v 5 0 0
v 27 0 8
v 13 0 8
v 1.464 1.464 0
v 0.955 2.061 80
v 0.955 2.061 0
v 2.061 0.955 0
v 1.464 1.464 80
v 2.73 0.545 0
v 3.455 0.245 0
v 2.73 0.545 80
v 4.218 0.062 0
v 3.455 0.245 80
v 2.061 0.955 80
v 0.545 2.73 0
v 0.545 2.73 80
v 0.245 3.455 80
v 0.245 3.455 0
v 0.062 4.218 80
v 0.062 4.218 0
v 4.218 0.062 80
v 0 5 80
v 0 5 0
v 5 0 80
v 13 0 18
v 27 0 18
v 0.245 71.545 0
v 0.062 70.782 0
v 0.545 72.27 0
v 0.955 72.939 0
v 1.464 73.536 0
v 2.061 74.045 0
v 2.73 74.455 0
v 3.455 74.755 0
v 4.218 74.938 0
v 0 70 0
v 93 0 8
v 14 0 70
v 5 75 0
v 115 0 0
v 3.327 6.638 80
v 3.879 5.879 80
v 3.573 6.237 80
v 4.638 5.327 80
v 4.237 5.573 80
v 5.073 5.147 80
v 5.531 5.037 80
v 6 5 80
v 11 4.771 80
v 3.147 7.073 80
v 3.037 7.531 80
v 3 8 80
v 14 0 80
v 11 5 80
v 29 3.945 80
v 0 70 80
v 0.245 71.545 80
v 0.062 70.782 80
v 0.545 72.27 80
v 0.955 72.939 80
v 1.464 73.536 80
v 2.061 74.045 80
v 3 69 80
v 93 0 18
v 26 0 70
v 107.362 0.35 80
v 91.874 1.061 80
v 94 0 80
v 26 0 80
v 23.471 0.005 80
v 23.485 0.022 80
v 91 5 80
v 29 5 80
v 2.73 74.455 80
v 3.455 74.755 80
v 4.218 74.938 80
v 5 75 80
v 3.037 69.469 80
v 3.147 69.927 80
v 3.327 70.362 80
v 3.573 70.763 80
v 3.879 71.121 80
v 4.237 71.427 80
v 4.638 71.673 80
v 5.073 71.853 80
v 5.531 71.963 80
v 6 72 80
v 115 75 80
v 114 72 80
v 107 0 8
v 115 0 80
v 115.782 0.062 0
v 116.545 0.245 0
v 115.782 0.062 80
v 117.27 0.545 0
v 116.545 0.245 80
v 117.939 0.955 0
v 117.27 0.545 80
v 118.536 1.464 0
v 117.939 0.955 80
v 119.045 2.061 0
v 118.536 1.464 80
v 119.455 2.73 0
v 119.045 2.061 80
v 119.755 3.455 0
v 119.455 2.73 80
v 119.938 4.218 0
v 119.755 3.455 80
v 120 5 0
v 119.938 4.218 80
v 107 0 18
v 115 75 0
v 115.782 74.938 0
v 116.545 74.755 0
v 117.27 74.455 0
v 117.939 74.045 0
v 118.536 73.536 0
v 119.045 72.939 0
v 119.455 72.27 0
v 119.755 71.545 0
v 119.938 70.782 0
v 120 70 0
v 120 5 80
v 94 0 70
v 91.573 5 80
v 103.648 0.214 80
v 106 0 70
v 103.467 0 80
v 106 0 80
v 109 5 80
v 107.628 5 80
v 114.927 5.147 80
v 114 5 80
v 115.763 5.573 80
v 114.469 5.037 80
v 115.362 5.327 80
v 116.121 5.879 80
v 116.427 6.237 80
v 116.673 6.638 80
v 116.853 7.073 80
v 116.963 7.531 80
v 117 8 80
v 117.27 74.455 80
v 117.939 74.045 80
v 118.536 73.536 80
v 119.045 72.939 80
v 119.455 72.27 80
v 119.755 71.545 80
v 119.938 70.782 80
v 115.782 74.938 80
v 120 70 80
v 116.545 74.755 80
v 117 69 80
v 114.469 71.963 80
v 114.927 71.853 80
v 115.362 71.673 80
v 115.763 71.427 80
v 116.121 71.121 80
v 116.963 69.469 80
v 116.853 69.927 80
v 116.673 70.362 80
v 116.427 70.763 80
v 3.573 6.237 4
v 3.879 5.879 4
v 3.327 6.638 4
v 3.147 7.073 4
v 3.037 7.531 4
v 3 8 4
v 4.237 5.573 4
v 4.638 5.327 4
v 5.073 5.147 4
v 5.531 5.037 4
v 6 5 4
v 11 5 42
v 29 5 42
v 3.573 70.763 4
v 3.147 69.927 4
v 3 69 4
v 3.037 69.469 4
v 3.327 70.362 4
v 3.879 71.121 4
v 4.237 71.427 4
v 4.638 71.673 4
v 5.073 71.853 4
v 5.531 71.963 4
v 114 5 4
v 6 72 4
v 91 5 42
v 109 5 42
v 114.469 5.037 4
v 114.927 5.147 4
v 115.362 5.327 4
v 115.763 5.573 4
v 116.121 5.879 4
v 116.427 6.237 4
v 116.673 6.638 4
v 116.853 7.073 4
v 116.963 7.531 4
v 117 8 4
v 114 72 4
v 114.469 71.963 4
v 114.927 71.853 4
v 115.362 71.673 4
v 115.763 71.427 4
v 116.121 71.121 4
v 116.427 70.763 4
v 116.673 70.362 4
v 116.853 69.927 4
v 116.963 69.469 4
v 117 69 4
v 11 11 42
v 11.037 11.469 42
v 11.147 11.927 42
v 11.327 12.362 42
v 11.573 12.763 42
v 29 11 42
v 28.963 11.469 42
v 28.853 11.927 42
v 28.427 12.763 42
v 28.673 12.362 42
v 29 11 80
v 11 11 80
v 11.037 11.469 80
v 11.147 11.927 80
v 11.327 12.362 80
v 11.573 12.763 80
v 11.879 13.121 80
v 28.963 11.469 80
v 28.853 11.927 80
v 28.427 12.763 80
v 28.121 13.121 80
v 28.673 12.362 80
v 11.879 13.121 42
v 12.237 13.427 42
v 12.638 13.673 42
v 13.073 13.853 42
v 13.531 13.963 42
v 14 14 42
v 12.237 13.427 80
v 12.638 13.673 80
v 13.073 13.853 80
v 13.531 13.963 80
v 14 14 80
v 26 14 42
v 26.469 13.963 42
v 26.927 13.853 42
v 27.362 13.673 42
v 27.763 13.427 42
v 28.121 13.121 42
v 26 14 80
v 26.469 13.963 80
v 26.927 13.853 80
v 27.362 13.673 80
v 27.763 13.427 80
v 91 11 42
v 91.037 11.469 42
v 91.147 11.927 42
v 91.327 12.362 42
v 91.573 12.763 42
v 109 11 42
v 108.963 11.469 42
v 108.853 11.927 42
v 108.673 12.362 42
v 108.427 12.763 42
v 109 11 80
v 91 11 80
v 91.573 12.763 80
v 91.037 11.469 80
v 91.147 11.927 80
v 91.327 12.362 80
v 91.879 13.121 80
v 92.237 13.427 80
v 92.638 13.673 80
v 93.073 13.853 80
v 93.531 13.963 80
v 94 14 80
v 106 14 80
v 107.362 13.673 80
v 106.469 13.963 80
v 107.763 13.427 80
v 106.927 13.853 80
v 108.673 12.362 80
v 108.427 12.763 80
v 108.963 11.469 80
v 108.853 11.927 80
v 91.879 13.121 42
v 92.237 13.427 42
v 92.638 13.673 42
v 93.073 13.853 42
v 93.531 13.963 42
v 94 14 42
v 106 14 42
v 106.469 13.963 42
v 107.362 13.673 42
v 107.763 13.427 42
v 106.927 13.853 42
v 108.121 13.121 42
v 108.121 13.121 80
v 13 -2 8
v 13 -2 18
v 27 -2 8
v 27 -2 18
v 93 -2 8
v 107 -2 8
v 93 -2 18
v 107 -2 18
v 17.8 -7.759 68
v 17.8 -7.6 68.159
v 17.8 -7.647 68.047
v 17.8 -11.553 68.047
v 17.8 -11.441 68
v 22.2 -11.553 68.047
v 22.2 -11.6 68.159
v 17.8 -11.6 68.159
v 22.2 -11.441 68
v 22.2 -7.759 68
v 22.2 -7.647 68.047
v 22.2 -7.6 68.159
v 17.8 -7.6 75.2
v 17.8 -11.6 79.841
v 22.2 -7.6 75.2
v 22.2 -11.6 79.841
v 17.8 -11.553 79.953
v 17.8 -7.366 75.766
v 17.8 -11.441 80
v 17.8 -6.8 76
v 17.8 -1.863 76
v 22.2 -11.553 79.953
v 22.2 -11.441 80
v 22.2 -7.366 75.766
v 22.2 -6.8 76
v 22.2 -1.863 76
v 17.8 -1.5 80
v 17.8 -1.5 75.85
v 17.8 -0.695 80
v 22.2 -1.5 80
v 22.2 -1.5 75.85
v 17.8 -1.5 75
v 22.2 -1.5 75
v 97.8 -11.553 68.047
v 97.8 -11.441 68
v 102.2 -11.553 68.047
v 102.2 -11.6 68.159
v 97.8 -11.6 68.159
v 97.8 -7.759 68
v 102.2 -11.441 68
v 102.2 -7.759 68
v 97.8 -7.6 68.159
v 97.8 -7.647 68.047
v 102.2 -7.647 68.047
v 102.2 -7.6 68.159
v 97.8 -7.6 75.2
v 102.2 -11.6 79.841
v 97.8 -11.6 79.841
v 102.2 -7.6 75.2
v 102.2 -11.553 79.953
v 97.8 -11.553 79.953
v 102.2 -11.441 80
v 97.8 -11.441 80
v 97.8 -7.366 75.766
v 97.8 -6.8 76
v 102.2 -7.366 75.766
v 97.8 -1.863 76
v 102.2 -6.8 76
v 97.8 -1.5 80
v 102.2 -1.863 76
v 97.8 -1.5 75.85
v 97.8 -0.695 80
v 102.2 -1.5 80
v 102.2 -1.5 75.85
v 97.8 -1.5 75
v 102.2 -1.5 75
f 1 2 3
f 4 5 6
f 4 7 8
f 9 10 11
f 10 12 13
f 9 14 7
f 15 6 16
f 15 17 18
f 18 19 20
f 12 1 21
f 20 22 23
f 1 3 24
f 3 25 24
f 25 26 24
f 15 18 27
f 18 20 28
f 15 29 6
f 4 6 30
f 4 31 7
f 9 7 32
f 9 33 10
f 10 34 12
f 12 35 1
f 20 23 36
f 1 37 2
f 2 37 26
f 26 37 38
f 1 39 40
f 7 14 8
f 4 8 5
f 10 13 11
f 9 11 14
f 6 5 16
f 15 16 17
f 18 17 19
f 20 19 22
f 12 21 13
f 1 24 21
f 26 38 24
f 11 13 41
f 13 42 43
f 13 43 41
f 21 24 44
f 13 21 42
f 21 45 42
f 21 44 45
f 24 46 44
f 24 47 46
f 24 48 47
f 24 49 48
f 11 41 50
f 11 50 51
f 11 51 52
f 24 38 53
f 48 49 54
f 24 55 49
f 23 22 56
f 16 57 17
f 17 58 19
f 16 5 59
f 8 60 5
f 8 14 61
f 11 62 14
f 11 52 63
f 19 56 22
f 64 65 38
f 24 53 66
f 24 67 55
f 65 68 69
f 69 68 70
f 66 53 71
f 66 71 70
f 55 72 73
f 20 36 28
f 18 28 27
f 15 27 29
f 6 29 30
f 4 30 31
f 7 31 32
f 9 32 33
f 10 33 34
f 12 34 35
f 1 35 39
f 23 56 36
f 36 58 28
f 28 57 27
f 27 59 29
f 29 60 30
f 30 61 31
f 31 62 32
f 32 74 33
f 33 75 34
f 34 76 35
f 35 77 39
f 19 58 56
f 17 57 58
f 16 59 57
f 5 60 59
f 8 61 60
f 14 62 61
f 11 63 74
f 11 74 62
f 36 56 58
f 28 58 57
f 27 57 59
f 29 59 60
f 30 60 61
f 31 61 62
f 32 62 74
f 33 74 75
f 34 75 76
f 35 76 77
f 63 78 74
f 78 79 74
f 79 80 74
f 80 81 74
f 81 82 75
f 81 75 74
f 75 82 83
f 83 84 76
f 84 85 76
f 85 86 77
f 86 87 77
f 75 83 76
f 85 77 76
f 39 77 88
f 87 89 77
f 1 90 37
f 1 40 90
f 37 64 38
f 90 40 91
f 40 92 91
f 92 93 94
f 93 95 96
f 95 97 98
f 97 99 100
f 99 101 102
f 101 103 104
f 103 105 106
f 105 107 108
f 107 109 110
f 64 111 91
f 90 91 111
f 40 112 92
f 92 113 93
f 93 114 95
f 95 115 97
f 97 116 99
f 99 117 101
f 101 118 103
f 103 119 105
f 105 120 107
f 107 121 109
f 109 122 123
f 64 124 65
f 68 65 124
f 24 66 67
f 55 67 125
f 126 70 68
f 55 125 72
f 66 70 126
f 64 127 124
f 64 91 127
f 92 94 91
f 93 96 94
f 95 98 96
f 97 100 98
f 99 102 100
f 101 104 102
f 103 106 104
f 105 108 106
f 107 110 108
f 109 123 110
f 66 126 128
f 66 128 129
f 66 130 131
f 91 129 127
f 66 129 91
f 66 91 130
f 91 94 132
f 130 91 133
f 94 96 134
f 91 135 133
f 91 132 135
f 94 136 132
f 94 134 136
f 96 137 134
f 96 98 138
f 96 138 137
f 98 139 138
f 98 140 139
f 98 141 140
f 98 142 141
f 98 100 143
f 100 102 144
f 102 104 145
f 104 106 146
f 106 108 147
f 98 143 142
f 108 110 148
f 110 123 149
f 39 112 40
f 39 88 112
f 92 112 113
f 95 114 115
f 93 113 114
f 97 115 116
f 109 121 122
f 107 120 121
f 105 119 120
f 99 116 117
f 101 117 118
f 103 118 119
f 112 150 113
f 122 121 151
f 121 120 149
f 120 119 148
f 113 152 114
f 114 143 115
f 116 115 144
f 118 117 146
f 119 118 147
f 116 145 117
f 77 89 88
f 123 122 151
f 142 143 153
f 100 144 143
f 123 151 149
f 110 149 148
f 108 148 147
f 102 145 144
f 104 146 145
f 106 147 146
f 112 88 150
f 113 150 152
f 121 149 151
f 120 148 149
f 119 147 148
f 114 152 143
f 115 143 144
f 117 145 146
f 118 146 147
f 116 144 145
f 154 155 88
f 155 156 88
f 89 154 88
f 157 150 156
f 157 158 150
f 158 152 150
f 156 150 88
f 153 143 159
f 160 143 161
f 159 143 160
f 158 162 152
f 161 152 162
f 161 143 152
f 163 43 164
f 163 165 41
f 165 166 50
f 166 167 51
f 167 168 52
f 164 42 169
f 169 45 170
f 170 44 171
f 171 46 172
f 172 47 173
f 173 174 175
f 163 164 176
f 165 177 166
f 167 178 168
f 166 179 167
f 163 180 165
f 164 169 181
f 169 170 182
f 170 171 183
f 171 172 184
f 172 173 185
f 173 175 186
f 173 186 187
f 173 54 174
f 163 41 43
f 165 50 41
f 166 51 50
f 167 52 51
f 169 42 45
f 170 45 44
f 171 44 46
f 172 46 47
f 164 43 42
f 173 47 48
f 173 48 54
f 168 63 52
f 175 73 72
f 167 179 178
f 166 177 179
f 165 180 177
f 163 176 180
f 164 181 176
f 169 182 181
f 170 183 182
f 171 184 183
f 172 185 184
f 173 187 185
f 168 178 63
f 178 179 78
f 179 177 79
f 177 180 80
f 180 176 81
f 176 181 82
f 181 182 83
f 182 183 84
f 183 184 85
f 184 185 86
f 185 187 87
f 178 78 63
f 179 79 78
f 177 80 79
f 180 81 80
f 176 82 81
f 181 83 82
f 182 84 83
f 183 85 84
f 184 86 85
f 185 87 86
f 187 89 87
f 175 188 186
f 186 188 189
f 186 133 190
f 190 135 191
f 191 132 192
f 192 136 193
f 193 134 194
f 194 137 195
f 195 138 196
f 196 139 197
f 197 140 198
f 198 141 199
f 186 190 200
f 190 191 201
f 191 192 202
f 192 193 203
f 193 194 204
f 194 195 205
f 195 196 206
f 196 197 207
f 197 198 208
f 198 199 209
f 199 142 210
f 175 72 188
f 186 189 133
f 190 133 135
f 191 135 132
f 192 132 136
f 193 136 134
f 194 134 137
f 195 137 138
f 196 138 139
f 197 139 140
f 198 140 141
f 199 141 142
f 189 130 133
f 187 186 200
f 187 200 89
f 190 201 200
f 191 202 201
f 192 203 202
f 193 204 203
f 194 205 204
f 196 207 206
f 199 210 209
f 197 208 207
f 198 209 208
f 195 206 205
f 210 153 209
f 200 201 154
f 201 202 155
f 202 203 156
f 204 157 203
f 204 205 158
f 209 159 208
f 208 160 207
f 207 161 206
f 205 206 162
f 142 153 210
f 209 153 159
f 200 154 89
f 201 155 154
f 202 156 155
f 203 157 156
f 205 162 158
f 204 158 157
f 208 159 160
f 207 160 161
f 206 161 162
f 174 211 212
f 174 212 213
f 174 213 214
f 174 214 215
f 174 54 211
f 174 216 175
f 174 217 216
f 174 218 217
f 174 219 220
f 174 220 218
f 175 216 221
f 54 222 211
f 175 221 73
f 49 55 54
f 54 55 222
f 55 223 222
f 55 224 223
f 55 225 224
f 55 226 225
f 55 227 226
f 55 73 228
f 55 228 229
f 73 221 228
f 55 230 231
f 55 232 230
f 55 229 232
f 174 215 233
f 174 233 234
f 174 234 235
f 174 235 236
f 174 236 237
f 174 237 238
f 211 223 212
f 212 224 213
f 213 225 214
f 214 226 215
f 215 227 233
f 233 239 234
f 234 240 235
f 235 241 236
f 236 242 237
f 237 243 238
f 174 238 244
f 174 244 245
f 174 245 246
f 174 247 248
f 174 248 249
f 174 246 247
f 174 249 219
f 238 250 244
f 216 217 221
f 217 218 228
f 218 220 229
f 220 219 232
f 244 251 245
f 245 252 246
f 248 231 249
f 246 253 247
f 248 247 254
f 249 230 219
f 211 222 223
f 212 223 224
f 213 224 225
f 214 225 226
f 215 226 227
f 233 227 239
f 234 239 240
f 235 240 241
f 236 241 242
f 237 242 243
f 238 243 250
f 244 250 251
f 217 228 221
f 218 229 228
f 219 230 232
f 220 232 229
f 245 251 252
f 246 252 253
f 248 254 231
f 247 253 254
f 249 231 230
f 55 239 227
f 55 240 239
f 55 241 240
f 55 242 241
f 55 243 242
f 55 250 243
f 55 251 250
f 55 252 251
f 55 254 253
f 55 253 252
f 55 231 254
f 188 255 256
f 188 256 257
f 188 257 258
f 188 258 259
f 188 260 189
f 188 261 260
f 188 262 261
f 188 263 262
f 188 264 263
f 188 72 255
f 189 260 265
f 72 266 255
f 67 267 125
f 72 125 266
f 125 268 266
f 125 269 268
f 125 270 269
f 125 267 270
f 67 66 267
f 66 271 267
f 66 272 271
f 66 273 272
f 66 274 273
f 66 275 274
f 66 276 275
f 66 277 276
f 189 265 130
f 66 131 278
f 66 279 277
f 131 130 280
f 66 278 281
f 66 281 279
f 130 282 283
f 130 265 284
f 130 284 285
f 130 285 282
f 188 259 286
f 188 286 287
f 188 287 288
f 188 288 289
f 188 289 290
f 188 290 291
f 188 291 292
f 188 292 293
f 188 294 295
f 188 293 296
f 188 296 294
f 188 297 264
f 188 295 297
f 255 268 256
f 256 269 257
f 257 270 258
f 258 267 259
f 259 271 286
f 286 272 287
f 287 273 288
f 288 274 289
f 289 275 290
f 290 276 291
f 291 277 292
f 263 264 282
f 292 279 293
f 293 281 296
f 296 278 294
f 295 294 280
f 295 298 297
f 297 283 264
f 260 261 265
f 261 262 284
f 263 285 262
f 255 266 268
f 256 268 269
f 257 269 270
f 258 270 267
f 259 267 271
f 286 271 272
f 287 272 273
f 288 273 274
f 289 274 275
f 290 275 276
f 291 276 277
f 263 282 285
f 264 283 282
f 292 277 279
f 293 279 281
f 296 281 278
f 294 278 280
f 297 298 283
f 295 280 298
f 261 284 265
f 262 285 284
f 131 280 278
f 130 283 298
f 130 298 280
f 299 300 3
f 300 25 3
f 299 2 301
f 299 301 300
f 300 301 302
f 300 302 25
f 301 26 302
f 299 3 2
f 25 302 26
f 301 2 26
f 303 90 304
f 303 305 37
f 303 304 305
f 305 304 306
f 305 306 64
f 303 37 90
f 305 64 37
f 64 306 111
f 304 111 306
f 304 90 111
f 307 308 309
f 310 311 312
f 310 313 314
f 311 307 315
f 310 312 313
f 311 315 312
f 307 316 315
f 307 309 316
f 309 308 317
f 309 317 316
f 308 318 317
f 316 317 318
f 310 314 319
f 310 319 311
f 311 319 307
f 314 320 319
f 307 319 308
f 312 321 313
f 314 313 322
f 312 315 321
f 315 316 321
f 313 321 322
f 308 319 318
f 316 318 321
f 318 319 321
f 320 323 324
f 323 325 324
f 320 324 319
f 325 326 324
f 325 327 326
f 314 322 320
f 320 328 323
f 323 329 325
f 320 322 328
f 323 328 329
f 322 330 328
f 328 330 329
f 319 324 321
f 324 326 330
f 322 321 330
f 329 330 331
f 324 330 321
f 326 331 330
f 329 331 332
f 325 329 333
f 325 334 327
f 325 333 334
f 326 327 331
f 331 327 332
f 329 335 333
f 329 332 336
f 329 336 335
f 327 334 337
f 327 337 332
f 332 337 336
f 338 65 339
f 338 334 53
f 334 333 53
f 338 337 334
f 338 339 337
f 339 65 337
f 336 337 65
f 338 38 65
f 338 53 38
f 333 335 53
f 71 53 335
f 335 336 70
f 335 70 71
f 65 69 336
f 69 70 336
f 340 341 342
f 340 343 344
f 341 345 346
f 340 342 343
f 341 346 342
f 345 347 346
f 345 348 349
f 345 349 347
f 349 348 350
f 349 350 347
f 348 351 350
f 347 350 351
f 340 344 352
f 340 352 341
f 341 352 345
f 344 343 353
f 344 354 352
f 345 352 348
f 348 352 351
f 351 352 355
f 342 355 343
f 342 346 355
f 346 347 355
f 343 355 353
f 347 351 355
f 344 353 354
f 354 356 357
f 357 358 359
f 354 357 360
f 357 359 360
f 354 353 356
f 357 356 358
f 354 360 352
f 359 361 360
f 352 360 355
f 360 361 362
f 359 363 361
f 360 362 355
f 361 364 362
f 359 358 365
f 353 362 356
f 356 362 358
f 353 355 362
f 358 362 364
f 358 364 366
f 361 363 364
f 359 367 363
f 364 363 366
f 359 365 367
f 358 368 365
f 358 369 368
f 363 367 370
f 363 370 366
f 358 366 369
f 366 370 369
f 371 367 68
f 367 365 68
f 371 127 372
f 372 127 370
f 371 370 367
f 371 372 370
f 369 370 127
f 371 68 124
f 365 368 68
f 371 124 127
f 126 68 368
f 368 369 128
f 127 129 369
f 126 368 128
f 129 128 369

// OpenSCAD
// SKADIS hook assembly preview. Editable: skadis-integral.scad
color([0.18,0.55,0.64]) polyhedron(points=[[5,0,0],[27,0,8],[13,0,8],[1.4644660949707031,1.4644660949707031,0],[0.9549150466918945,2.0610737800598145,80],[0.9549150466918945,2.0610737800598145,0],[2.0610737800598145,0.9549150466918945,0],[1.4644660949707031,1.4644660949707031,80],[2.7300474643707275,0.5449673533439636,0],[3.4549150466918945,0.24471741914749146,0],[2.7300474643707275,0.5449673533439636,80],[4.217827796936035,0.06155829876661301,0],[3.4549150466918945,0.24471741914749146,80],[2.0610737800598145,0.9549150466918945,80],[0.5449673533439636,2.7300474643707275,0],[0.5449673533439636,2.7300474643707275,80],[0.24471741914749146,3.4549150466918945,80],[0.24471741914749146,3.4549150466918945,0],[0.06155829876661301,4.217827796936035,80],[0.06155829876661301,4.217827796936035,0],[4.217827796936035,0.06155829876661301,80],[0,5,80],[0,5,0],[5,0,80],[13,0,18],[27,0,18],[0.24471741914749146,71.54508209228516,0],[0.06155829876661301,70.78217315673828,0],[0.5449673533439636,72.26995086669922,0],[0.9549150466918945,72.93892669677734,0],[1.4644660949707031,73.53553771972656,0],[2.0610737800598145,74.04508209228516,0],[2.7300474643707275,74.45503234863281,0],[3.4549150466918945,74.75527954101562,0],[4.217827796936035,74.93843841552734,0],[0,70,0],[93,0,8],[14,0,70],[5,75,0],[115,0,0],[3.3269803524017334,6.638028621673584,80],[3.8786797523498535,5.8786797523498535,80],[3.572948932647705,6.236644268035889,80],[4.638028621673584,5.3269805908203125,80],[4.236644268035889,5.572948932647705,80],[5.072948932647705,5.1468305587768555,80],[5.530696392059326,5.036934852600098,80],[6,5,80],[11,4.770642280578613,80],[3.1468305587768555,7.072948932647705,80],[3.0369350910186768,7.530696392059326,80],[3,8,80],[14,0,80],[11,5,80],[29,3.9449541568756104,80],[0,70,80],[0.24471741914749146,71.54508209228516,80],[0.06155829876661301,70.78217315673828,80],[0.5449673533439636,72.26995086669922,80],[0.9549150466918945,72.93892669677734,80],[1.4644660949707031,73.53553771972656,80],[2.0610737800598145,74.04508209228516,80],[3,69,80],[93,0,18],[26,0,70],[107.36196899414062,0.35036829113960266,80],[91.87399291992188,1.0608259439468384,80],[94,0,80],[26,0,80],[23.47108268737793,0.0052294121123850346,80],[23.485448837280273,0.022241592407226562,80],[91,5,80],[29,5,80],[2.7300474643707275,74.45503234863281,80],[3.4549150466918945,74.75527954101562,80],[4.217827796936035,74.93843841552734,80],[5,75,80],[3.0369350910186768,69.46930694580078,80],[3.1468305587768555,69.92704772949219,80],[3.3269803524017334,70.36196899414062,80],[3.572948932647705,70.76335906982422,80],[3.8786797523498535,71.12132263183594,80],[4.236644268035889,71.42704772949219,80],[4.638028621673584,71.67301940917969,80],[5.072948932647705,71.8531723022461,80],[5.530696392059326,71.96306610107422,80],[6,72,80],[115,75,80],[114,72,80],[107,0,8],[115,0,80],[115.78217315673828,0.06155829876661301,0],[116.54508209228516,0.24471741914749146,0],[115.78217315673828,0.06155829876661301,80],[117.26995086669922,0.5449673533439636,0],[116.54508209228516,0.24471741914749146,80],[117.93892669677734,0.9549150466918945,0],[117.26995086669922,0.5449673533439636,80],[118.53553771972656,1.4644660949707031,0],[117.93892669677734,0.9549150466918945,80],[119.04508209228516,2.0610737800598145,0],[118.53553771972656,1.4644660949707031,80],[119.45503234863281,2.7300474643707275,0],[119.04508209228516,2.0610737800598145,80],[119.75527954101562,3.4549150466918945,0],[119.45503234863281,2.7300474643707275,80],[119.93843841552734,4.217827796936035,0],[119.75527954101562,3.4549150466918945,80],[120,5,0],[119.93843841552734,4.217827796936035,80],[107,0,18],[115,75,0],[115.78217315673828,74.93843841552734,0],[116.54508209228516,74.75527954101562,0],[117.26995086669922,74.45503234863281,0],[117.93892669677734,74.04508209228516,0],[118.53553771972656,73.53553771972656,0],[119.04508209228516,72.93892669677734,0],[119.45503234863281,72.26995086669922,0],[119.75527954101562,71.54508209228516,0],[119.93843841552734,70.78217315673828,0],[120,70,0],[120,5,80],[94,0,70],[91.57295227050781,5,80],[103.6476058959961,0.21426697075366974,80],[106,0,70],[103.46666717529297,0,80],[106,0,80],[109,5,80],[107.6277084350586,5,80],[114.92704772949219,5.1468305587768555,80],[114,5,80],[115.76335906982422,5.572948932647705,80],[114.46930694580078,5.036934852600098,80],[115.36196899414062,5.3269805908203125,80],[116.12132263183594,5.8786797523498535,80],[116.42704772949219,6.236644268035889,80],[116.67301940917969,6.638028621673584,80],[116.8531723022461,7.072948932647705,80],[116.96306610107422,7.530696392059326,80],[117,8,80],[117.26995086669922,74.45503234863281,80],[117.93892669677734,74.04508209228516,80],[118.53553771972656,73.53553771972656,80],[119.04508209228516,72.93892669677734,80],[119.45503234863281,72.26995086669922,80],[119.75527954101562,71.54508209228516,80],[119.93843841552734,70.78217315673828,80],[115.78217315673828,74.93843841552734,80],[120,70,80],[116.54508209228516,74.75527954101562,80],[117,69,80],[114.46930694580078,71.96306610107422,80],[114.92704772949219,71.8531723022461,80],[115.36196899414062,71.67301940917969,80],[115.76335906982422,71.42704772949219,80],[116.12132263183594,71.12132263183594,80],[116.96306610107422,69.46930694580078,80],[116.8531723022461,69.92704772949219,80],[116.67301940917969,70.36196899414062,80],[116.42704772949219,70.76335906982422,80],[3.572948932647705,6.236644268035889,4],[3.8786797523498535,5.8786797523498535,4],[3.3269803524017334,6.638028621673584,4],[3.1468305587768555,7.072948932647705,4],[3.0369350910186768,7.530696392059326,4],[3,8,4],[4.236644268035889,5.572948932647705,4],[4.638028621673584,5.3269805908203125,4],[5.072948932647705,5.1468305587768555,4],[5.530696392059326,5.036934852600098,4],[6,5,4],[11,5,42],[29,5,42],[3.572948932647705,70.76335906982422,4],[3.1468305587768555,69.92704772949219,4],[3,69,4],[3.0369350910186768,69.46930694580078,4],[3.3269803524017334,70.36196899414062,4],[3.8786797523498535,71.12132263183594,4],[4.236644268035889,71.42704772949219,4],[4.638028621673584,71.67301940917969,4],[5.072948932647705,71.8531723022461,4],[5.530696392059326,71.96306610107422,4],[114,5,4],[6,72,4],[91,5,42],[109,5,42],[114.46930694580078,5.036934852600098,4],[114.92704772949219,5.1468305587768555,4],[115.36196899414062,5.3269805908203125,4],[115.76335906982422,5.572948932647705,4],[116.12132263183594,5.8786797523498535,4],[116.42704772949219,6.236644268035889,4],[116.67301940917969,6.638028621673584,4],[116.8531723022461,7.072948932647705,4],[116.96306610107422,7.530696392059326,4],[117,8,4],[114,72,4],[114.46930694580078,71.96306610107422,4],[114.92704772949219,71.8531723022461,4],[115.36196899414062,71.67301940917969,4],[115.76335906982422,71.42704772949219,4],[116.12132263183594,71.12132263183594,4],[116.42704772949219,70.76335906982422,4],[116.67301940917969,70.36196899414062,4],[116.8531723022461,69.92704772949219,4],[116.96306610107422,69.46930694580078,4],[117,69,4],[11,11,42],[11.036934852600098,11.469303131103516,42],[11.146830558776855,11.927050590515137,42],[11.326980590820312,12.361971855163574,42],[11.572949409484863,12.76335620880127,42],[29,11,42],[28.963064193725586,11.469303131103516,42],[28.85317039489746,11.927050590515137,42],[28.427051544189453,12.76335620880127,42],[28.673019409179688,12.361971855163574,42],[29,11,80],[11,11,80],[11.036934852600098,11.469303131103516,80],[11.146830558776855,11.927050590515137,80],[11.326980590820312,12.361971855163574,80],[11.572949409484863,12.76335620880127,80],[11.878679275512695,13.121320724487305,80],[28.963064193725586,11.469303131103516,80],[28.85317039489746,11.927050590515137,80],[28.427051544189453,12.76335620880127,80],[28.121320724487305,13.121320724487305,80],[28.673019409179688,12.361971855163574,80],[11.878679275512695,13.121320724487305,42],[12.23664379119873,13.427050590515137,42],[12.638028144836426,13.673019409179688,42],[13.072949409484863,13.853169441223145,42],[13.530696868896484,13.963065147399902,42],[14,14,42],[12.23664379119873,13.427050590515137,80],[12.638028144836426,13.673019409179688,80],[13.072949409484863,13.853169441223145,80],[13.530696868896484,13.963065147399902,80],[14,14,80],[26,14,42],[26.469303131103516,13.963065147399902,42],[26.927051544189453,13.853169441223145,42],[27.361970901489258,13.673019409179688,42],[27.763355255126953,13.427050590515137,42],[28.121320724487305,13.121320724487305,42],[26,14,80],[26.469303131103516,13.963065147399902,80],[26.927051544189453,13.853169441223145,80],[27.361970901489258,13.673019409179688,80],[27.763355255126953,13.427050590515137,80],[91,11,42],[91.03693389892578,11.469303131103516,42],[91.1468276977539,11.927050590515137,42],[91.32698059082031,12.361971855163574,42],[91.57295227050781,12.76335620880127,42],[109,11,42],[108.96306610107422,11.469303131103516,42],[108.8531723022461,11.927050590515137,42],[108.67301940917969,12.361971855163574,42],[108.42704772949219,12.76335620880127,42],[109,11,80],[91,11,80],[91.57295227050781,12.76335620880127,80],[91.03693389892578,11.469303131103516,80],[91.1468276977539,11.927050590515137,80],[91.32698059082031,12.361971855163574,80],[91.87867736816406,13.121320724487305,80],[92.23664093017578,13.427050590515137,80],[92.63803100585938,13.673019409179688,80],[93.07295227050781,13.853169441223145,80],[93.53069305419922,13.963065147399902,80],[94,14,80],[106,14,80],[107.36196899414062,13.673019409179688,80],[106.46930694580078,13.963065147399902,80],[107.76335906982422,13.427050590515137,80],[106.92704772949219,13.853169441223145,80],[108.67301940917969,12.361971855163574,80],[108.42704772949219,12.76335620880127,80],[108.96306610107422,11.469303131103516,80],[108.8531723022461,11.927050590515137,80],[91.87867736816406,13.121320724487305,42],[92.23664093017578,13.427050590515137,42],[92.63803100585938,13.673019409179688,42],[93.07295227050781,13.853169441223145,42],[93.53069305419922,13.963065147399902,42],[94,14,42],[106,14,42],[106.46930694580078,13.963065147399902,42],[107.36196899414062,13.673019409179688,42],[107.76335906982422,13.427050590515137,42],[106.92704772949219,13.853169441223145,42],[108.12132263183594,13.121320724487305,42],[108.12132263183594,13.121320724487305,80],[13,-2,8],[13,-2,18],[27,-2,8],[27,-2,18],[93,-2,8],[107,-2,8],[93,-2,18],[107,-2,18],[17.799999237060547,-7.759130001068115,68],[17.799999237060547,-7.599999904632568,68.15912628173828],[17.799999237060547,-7.646607875823975,68.0466079711914],[17.799999237060547,-11.553391456604004,68.0466079711914],[17.799999237060547,-11.44087028503418,68],[22.200000762939453,-11.553391456604004,68.0466079711914],[22.200000762939453,-11.600000381469727,68.15912628173828],[17.799999237060547,-11.600000381469727,68.15912628173828],[22.200000762939453,-11.44087028503418,68],[22.200000762939453,-7.759130001068115,68],[22.200000762939453,-7.646607875823975,68.0466079711914],[22.200000762939453,-7.599999904632568,68.15912628173828],[17.799999237060547,-7.599999904632568,75.19999694824219],[17.799999237060547,-11.600000381469727,79.84087371826172],[22.200000762939453,-7.599999904632568,75.19999694824219],[22.200000762939453,-11.600000381469727,79.84087371826172],[17.799999237060547,-11.553391456604004,79.9533920288086],[17.799999237060547,-7.36568546295166,75.76568603515625],[17.799999237060547,-11.44087028503418,80],[17.799999237060547,-6.800000190734863,76],[17.799999237060547,-1.863014578819275,76],[22.200000762939453,-11.553391456604004,79.9533920288086],[22.200000762939453,-11.44087028503418,80],[22.200000762939453,-7.36568546295166,75.76568603515625],[22.200000762939453,-6.800000190734863,76],[22.200000762939453,-1.863014578819275,76],[17.799999237060547,-1.5,80],[17.799999237060547,-1.5,75.8496322631836],[17.799999237060547,-0.6951219439506531,80],[22.200000762939453,-1.5,80],[22.200000762939453,-1.5,75.8496322631836],[17.799999237060547,-1.5,75],[22.200000762939453,-1.5,75],[97.80000305175781,-11.553391456604004,68.0466079711914],[97.80000305175781,-11.44087028503418,68],[102.19999694824219,-11.553391456604004,68.0466079711914],[102.19999694824219,-11.600000381469727,68.15912628173828],[97.80000305175781,-11.600000381469727,68.15912628173828],[97.80000305175781,-7.759130001068115,68],[102.19999694824219,-11.44087028503418,68],[102.19999694824219,-7.759130001068115,68],[97.80000305175781,-7.599999904632568,68.15912628173828],[97.80000305175781,-7.646607875823975,68.0466079711914],[102.19999694824219,-7.646607875823975,68.0466079711914],[102.19999694824219,-7.599999904632568,68.15912628173828],[97.80000305175781,-7.599999904632568,75.19999694824219],[102.19999694824219,-11.600000381469727,79.84087371826172],[97.80000305175781,-11.600000381469727,79.84087371826172],[102.19999694824219,-7.599999904632568,75.19999694824219],[102.19999694824219,-11.553391456604004,79.9533920288086],[97.80000305175781,-11.553391456604004,79.9533920288086],[102.19999694824219,-11.44087028503418,80],[97.80000305175781,-11.44087028503418,80],[97.80000305175781,-7.36568546295166,75.76568603515625],[97.80000305175781,-6.800000190734863,76],[102.19999694824219,-7.36568546295166,75.76568603515625],[97.80000305175781,-1.863014578819275,76],[102.19999694824219,-6.800000190734863,76],[97.80000305175781,-1.5,80],[102.19999694824219,-1.863014578819275,76],[97.80000305175781,-1.5,75.8496322631836],[97.80000305175781,-0.6951219439506531,80],[102.19999694824219,-1.5,80],[102.19999694824219,-1.5,75.8496322631836],[97.80000305175781,-1.5,75],[102.19999694824219,-1.5,75]],faces=[[2,1,0],[5,4,3],[7,6,3],[10,9,8],[12,11,9],[6,13,8],[15,5,14],[17,16,14],[19,18,17],[20,0,11],[22,21,19],[23,2,0],[23,24,2],[23,25,24],[26,17,14],[27,19,17],[5,28,14],[29,5,3],[6,30,3],[31,6,8],[9,32,8],[11,33,9],[0,34,11],[35,22,19],[1,36,0],[25,36,1],[37,36,25],[39,38,0],[7,13,6],[4,7,3],[10,12,9],[13,10,8],[15,4,5],[16,15,14],[18,16,17],[21,18,19],[12,20,11],[20,23,0],[23,37,25],[40,12,10],[42,41,12],[40,42,12],[43,23,20],[41,20,12],[41,44,20],[44,43,20],[43,45,23],[45,46,23],[46,47,23],[47,48,23],[49,40,10],[50,49,10],[51,50,10],[52,37,23],[53,48,47],[48,54,23],[55,21,22],[16,56,15],[18,57,16],[58,4,15],[4,59,7],[60,13,7],[13,61,10],[62,51,10],[21,55,18],[37,64,63],[65,52,23],[54,66,23],[68,67,64],[69,67,68],[70,52,65],[69,70,65],[72,71,54],[27,35,19],[26,27,17],[28,26,14],[29,28,5],[30,29,3],[31,30,6],[32,31,8],[33,32,9],[34,33,11],[38,34,0],[35,55,22],[27,57,35],[26,56,27],[28,58,26],[29,59,28],[30,60,29],[31,61,30],[32,73,31],[33,74,32],[34,75,33],[38,76,34],[55,57,18],[57,56,16],[56,58,15],[58,59,4],[59,60,7],[60,61,13],[73,62,10],[61,73,10],[57,55,35],[56,57,27],[58,56,26],[59,58,28],[60,59,29],[61,60,30],[73,61,31],[74,73,32],[75,74,33],[76,75,34],[73,77,62],[73,78,77],[73,79,78],[73,80,79],[74,81,80],[73,74,80],[82,81,74],[75,83,82],[75,84,83],[76,85,84],[76,86,85],[75,82,74],[75,76,84],[87,76,38],[76,88,86],[36,89,0],[89,39,0],[37,63,36],[90,39,89],[90,91,39],[93,92,91],[95,94,92],[97,96,94],[99,98,96],[101,100,98],[103,102,100],[105,104,102],[107,106,104],[109,108,106],[90,110,63],[110,90,89],[91,111,39],[92,112,91],[94,113,92],[96,114,94],[98,115,96],[100,116,98],[102,117,100],[104,118,102],[106,119,104],[108,120,106],[122,121,108],[64,123,63],[123,64,67],[66,65,23],[124,66,54],[67,69,125],[71,124,54],[125,69,65],[123,126,63],[126,90,63],[90,93,91],[93,95,92],[95,97,94],[97,99,96],[99,101,98],[101,103,100],[103,105,102],[105,107,104],[107,109,106],[109,122,108],[127,125,65],[128,127,65],[130,129,65],[126,128,90],[90,128,65],[129,90,65],[131,93,90],[132,90,129],[133,95,93],[132,134,90],[134,131,90],[131,135,93],[135,133,93],[133,136,95],[137,97,95],[136,137,95],[137,138,97],[138,139,97],[139,140,97],[140,141,97],[142,99,97],[143,101,99],[144,103,101],[145,105,103],[146,107,105],[141,142,97],[147,109,107],[148,122,109],[39,111,38],[111,87,38],[112,111,91],[114,113,94],[113,112,92],[115,114,96],[121,120,108],[120,119,106],[119,118,104],[116,115,98],[117,116,100],[118,117,102],[112,149,111],[150,120,121],[148,119,120],[147,118,119],[113,151,112],[114,142,113],[143,114,115],[145,116,117],[146,117,118],[116,144,115],[87,88,76],[150,121,122],[152,142,141],[142,143,99],[148,150,122],[147,148,109],[146,147,107],[143,144,101],[144,145,103],[145,146,105],[149,87,111],[151,149,112],[150,148,120],[148,147,119],[147,146,118],[142,151,113],[143,142,114],[145,144,116],[146,145,117],[144,143,115],[87,154,153],[87,155,154],[87,153,88],[155,149,156],[149,157,156],[149,151,157],[87,149,155],[158,142,152],[160,142,159],[159,142,158],[151,161,157],[161,151,160],[151,142,160],[163,42,162],[40,164,162],[49,165,164],[50,166,165],[51,167,166],[168,41,163],[169,44,168],[170,43,169],[171,45,170],[172,46,171],[174,173,172],[175,163,162],[165,176,164],[167,177,166],[166,178,165],[164,179,162],[180,168,163],[181,169,168],[182,170,169],[183,171,170],[184,172,171],[185,174,172],[186,185,172],[173,53,172],[42,40,162],[40,49,164],[49,50,165],[50,51,166],[44,41,168],[43,44,169],[45,43,170],[46,45,171],[41,42,163],[47,46,172],[53,47,172],[51,62,167],[71,72,174],[177,178,166],[178,176,165],[176,179,164],[179,175,162],[175,180,163],[180,181,168],[181,182,169],[182,183,170],[183,184,171],[184,186,172],[62,177,167],[77,178,177],[78,176,178],[79,179,176],[80,175,179],[81,180,175],[82,181,180],[83,182,181],[84,183,182],[85,184,183],[86,186,184],[62,77,177],[77,78,178],[78,79,176],[79,80,179],[80,81,175],[81,82,180],[82,83,181],[83,84,182],[84,85,183],[85,86,184],[86,88,186],[185,187,174],[188,187,185],[189,132,185],[190,134,189],[191,131,190],[192,135,191],[193,133,192],[194,136,193],[195,137,194],[196,138,195],[197,139,196],[198,140,197],[199,189,185],[200,190,189],[201,191,190],[202,192,191],[203,193,192],[204,194,193],[205,195,194],[206,196,195],[207,197,196],[208,198,197],[209,141,198],[187,71,174],[132,188,185],[134,132,189],[131,134,190],[135,131,191],[133,135,192],[136,133,193],[137,136,194],[138,137,195],[139,138,196],[140,139,197],[141,140,198],[132,129,188],[199,185,186],[88,199,186],[199,200,189],[200,201,190],[201,202,191],[202,203,192],[203,204,193],[205,206,195],[208,209,198],[206,207,196],[207,208,197],[204,205,194],[208,152,209],[153,200,199],[154,201,200],[155,202,201],[202,156,203],[157,204,203],[207,158,208],[206,159,207],[205,160,206],[161,205,204],[209,152,141],[158,152,208],[88,153,199],[153,154,200],[154,155,201],[155,156,202],[157,161,204],[156,157,203],[159,158,207],[160,159,206],[161,160,205],[211,210,173],[212,211,173],[213,212,173],[214,213,173],[210,53,173],[174,215,173],[215,216,173],[216,217,173],[219,218,173],[217,219,173],[220,215,174],[210,221,53],[72,220,174],[53,54,48],[221,54,53],[221,222,54],[222,223,54],[223,224,54],[224,225,54],[225,226,54],[227,72,54],[228,227,54],[227,220,72],[230,229,54],[229,231,54],[231,228,54],[232,214,173],[233,232,173],[234,233,173],[235,234,173],[236,235,173],[237,236,173],[211,222,210],[212,223,211],[213,224,212],[214,225,213],[232,226,214],[233,238,232],[234,239,233],[235,240,234],[236,241,235],[237,242,236],[243,237,173],[244,243,173],[245,244,173],[247,246,173],[248,247,173],[246,245,173],[218,248,173],[243,249,237],[220,216,215],[227,217,216],[228,219,217],[231,218,219],[244,250,243],[245,251,244],[248,230,247],[246,252,245],[253,246,247],[218,229,248],[222,221,210],[223,222,211],[224,223,212],[225,224,213],[226,225,214],[238,226,232],[239,238,233],[240,239,234],[241,240,235],[242,241,236],[249,242,237],[250,249,243],[220,227,216],[227,228,217],[231,229,218],[228,231,219],[251,250,244],[252,251,245],[230,253,247],[253,252,246],[229,230,248],[226,238,54],[238,239,54],[239,240,54],[240,241,54],[241,242,54],[242,249,54],[249,250,54],[250,251,54],[252,253,54],[251,252,54],[253,230,54],[255,254,187],[256,255,187],[257,256,187],[258,257,187],[188,259,187],[259,260,187],[260,261,187],[261,262,187],[262,263,187],[254,71,187],[264,259,188],[254,265,71],[124,266,66],[265,124,71],[265,267,124],[267,268,124],[268,269,124],[269,266,124],[266,65,66],[266,270,65],[270,271,65],[271,272,65],[272,273,65],[273,274,65],[274,275,65],[275,276,65],[129,264,188],[277,130,65],[276,278,65],[279,129,130],[280,277,65],[278,280,65],[282,281,129],[283,264,129],[284,283,129],[281,284,129],[285,258,187],[286,285,187],[287,286,187],[288,287,187],[289,288,187],[290,289,187],[291,290,187],[292,291,187],[294,293,187],[295,292,187],[293,295,187],[263,296,187],[296,294,187],[255,267,254],[256,268,255],[257,269,256],[258,266,257],[285,270,258],[286,271,285],[287,272,286],[288,273,287],[289,274,288],[290,275,289],[291,276,290],[281,263,262],[292,278,291],[295,280,292],[293,277,295],[279,293,294],[296,297,294],[263,282,296],[264,260,259],[283,261,260],[261,284,262],[267,265,254],[268,267,255],[269,268,256],[266,269,257],[270,266,258],[271,270,285],[272,271,286],[273,272,287],[274,273,288],[275,274,289],[276,275,290],[284,281,262],[281,282,263],[278,276,291],[280,278,292],[277,280,295],[279,277,293],[282,297,296],[297,279,294],[264,283,260],[283,284,261],[277,279,130],[297,282,129],[279,297,129],[2,299,298],[2,24,299],[300,1,298],[299,300,298],[301,300,299],[24,301,299],[301,25,300],[1,2,298],[25,301,24],[25,1,300],[303,89,302],[36,304,302],[304,303,302],[305,303,304],[63,305,304],[89,36,302],[36,63,304],[110,305,63],[305,110,303],[110,89,303],[308,307,306],[311,310,309],[313,312,309],[314,306,310],[312,311,309],[311,314,310],[314,315,306],[315,308,306],[316,307,308],[315,316,308],[316,317,307],[317,316,315],[318,313,309],[310,318,309],[306,318,310],[318,319,313],[307,318,306],[312,320,311],[321,312,313],[320,314,311],[320,315,314],[321,320,312],[317,318,307],[320,317,315],[320,318,317],[323,322,319],[323,324,322],[318,323,319],[323,325,324],[325,326,324],[319,321,313],[322,327,319],[324,328,322],[327,321,319],[328,327,322],[327,329,321],[328,329,327],[320,323,318],[329,325,323],[329,320,321],[330,329,328],[320,329,323],[329,330,325],[331,330,328],[332,328,324],[326,333,324],[333,332,324],[330,326,325],[331,326,330],[332,334,328],[335,331,328],[334,335,328],[336,333,326],[331,336,326],[335,336,331],[338,64,337],[52,333,337],[52,332,333],[333,336,337],[336,338,337],[336,64,338],[64,336,335],[64,37,337],[37,52,337],[52,334,332],[334,52,70],[69,335,334],[70,69,334],[335,68,64],[335,69,68],[341,340,339],[343,342,339],[345,344,340],[342,341,339],[341,345,340],[345,346,344],[348,347,344],[346,348,344],[349,347,348],[346,349,348],[349,350,347],[350,349,346],[351,343,339],[340,351,339],[344,351,340],[352,342,343],[351,353,343],[347,351,344],[350,351,347],[354,351,350],[342,354,341],[354,345,341],[354,346,345],[352,354,342],[354,350,346],[353,352,343],[356,355,353],[358,357,356],[359,356,353],[359,358,356],[355,352,353],[357,355,356],[351,359,353],[359,360,358],[354,359,351],[361,360,359],[360,362,358],[354,361,359],[361,363,360],[364,357,358],[355,361,352],[357,361,355],[361,354,352],[363,361,357],[365,363,357],[363,362,360],[362,366,358],[365,362,363],[366,364,358],[364,367,357],[367,368,357],[369,366,362],[365,369,362],[368,365,357],[368,369,365],[67,366,370],[67,364,366],[371,126,370],[369,126,371],[366,369,370],[369,371,370],[126,369,368],[123,67,370],[67,367,364],[126,123,370],[367,67,125],[127,368,367],[368,128,126],[127,367,125],[368,127,128]]);
